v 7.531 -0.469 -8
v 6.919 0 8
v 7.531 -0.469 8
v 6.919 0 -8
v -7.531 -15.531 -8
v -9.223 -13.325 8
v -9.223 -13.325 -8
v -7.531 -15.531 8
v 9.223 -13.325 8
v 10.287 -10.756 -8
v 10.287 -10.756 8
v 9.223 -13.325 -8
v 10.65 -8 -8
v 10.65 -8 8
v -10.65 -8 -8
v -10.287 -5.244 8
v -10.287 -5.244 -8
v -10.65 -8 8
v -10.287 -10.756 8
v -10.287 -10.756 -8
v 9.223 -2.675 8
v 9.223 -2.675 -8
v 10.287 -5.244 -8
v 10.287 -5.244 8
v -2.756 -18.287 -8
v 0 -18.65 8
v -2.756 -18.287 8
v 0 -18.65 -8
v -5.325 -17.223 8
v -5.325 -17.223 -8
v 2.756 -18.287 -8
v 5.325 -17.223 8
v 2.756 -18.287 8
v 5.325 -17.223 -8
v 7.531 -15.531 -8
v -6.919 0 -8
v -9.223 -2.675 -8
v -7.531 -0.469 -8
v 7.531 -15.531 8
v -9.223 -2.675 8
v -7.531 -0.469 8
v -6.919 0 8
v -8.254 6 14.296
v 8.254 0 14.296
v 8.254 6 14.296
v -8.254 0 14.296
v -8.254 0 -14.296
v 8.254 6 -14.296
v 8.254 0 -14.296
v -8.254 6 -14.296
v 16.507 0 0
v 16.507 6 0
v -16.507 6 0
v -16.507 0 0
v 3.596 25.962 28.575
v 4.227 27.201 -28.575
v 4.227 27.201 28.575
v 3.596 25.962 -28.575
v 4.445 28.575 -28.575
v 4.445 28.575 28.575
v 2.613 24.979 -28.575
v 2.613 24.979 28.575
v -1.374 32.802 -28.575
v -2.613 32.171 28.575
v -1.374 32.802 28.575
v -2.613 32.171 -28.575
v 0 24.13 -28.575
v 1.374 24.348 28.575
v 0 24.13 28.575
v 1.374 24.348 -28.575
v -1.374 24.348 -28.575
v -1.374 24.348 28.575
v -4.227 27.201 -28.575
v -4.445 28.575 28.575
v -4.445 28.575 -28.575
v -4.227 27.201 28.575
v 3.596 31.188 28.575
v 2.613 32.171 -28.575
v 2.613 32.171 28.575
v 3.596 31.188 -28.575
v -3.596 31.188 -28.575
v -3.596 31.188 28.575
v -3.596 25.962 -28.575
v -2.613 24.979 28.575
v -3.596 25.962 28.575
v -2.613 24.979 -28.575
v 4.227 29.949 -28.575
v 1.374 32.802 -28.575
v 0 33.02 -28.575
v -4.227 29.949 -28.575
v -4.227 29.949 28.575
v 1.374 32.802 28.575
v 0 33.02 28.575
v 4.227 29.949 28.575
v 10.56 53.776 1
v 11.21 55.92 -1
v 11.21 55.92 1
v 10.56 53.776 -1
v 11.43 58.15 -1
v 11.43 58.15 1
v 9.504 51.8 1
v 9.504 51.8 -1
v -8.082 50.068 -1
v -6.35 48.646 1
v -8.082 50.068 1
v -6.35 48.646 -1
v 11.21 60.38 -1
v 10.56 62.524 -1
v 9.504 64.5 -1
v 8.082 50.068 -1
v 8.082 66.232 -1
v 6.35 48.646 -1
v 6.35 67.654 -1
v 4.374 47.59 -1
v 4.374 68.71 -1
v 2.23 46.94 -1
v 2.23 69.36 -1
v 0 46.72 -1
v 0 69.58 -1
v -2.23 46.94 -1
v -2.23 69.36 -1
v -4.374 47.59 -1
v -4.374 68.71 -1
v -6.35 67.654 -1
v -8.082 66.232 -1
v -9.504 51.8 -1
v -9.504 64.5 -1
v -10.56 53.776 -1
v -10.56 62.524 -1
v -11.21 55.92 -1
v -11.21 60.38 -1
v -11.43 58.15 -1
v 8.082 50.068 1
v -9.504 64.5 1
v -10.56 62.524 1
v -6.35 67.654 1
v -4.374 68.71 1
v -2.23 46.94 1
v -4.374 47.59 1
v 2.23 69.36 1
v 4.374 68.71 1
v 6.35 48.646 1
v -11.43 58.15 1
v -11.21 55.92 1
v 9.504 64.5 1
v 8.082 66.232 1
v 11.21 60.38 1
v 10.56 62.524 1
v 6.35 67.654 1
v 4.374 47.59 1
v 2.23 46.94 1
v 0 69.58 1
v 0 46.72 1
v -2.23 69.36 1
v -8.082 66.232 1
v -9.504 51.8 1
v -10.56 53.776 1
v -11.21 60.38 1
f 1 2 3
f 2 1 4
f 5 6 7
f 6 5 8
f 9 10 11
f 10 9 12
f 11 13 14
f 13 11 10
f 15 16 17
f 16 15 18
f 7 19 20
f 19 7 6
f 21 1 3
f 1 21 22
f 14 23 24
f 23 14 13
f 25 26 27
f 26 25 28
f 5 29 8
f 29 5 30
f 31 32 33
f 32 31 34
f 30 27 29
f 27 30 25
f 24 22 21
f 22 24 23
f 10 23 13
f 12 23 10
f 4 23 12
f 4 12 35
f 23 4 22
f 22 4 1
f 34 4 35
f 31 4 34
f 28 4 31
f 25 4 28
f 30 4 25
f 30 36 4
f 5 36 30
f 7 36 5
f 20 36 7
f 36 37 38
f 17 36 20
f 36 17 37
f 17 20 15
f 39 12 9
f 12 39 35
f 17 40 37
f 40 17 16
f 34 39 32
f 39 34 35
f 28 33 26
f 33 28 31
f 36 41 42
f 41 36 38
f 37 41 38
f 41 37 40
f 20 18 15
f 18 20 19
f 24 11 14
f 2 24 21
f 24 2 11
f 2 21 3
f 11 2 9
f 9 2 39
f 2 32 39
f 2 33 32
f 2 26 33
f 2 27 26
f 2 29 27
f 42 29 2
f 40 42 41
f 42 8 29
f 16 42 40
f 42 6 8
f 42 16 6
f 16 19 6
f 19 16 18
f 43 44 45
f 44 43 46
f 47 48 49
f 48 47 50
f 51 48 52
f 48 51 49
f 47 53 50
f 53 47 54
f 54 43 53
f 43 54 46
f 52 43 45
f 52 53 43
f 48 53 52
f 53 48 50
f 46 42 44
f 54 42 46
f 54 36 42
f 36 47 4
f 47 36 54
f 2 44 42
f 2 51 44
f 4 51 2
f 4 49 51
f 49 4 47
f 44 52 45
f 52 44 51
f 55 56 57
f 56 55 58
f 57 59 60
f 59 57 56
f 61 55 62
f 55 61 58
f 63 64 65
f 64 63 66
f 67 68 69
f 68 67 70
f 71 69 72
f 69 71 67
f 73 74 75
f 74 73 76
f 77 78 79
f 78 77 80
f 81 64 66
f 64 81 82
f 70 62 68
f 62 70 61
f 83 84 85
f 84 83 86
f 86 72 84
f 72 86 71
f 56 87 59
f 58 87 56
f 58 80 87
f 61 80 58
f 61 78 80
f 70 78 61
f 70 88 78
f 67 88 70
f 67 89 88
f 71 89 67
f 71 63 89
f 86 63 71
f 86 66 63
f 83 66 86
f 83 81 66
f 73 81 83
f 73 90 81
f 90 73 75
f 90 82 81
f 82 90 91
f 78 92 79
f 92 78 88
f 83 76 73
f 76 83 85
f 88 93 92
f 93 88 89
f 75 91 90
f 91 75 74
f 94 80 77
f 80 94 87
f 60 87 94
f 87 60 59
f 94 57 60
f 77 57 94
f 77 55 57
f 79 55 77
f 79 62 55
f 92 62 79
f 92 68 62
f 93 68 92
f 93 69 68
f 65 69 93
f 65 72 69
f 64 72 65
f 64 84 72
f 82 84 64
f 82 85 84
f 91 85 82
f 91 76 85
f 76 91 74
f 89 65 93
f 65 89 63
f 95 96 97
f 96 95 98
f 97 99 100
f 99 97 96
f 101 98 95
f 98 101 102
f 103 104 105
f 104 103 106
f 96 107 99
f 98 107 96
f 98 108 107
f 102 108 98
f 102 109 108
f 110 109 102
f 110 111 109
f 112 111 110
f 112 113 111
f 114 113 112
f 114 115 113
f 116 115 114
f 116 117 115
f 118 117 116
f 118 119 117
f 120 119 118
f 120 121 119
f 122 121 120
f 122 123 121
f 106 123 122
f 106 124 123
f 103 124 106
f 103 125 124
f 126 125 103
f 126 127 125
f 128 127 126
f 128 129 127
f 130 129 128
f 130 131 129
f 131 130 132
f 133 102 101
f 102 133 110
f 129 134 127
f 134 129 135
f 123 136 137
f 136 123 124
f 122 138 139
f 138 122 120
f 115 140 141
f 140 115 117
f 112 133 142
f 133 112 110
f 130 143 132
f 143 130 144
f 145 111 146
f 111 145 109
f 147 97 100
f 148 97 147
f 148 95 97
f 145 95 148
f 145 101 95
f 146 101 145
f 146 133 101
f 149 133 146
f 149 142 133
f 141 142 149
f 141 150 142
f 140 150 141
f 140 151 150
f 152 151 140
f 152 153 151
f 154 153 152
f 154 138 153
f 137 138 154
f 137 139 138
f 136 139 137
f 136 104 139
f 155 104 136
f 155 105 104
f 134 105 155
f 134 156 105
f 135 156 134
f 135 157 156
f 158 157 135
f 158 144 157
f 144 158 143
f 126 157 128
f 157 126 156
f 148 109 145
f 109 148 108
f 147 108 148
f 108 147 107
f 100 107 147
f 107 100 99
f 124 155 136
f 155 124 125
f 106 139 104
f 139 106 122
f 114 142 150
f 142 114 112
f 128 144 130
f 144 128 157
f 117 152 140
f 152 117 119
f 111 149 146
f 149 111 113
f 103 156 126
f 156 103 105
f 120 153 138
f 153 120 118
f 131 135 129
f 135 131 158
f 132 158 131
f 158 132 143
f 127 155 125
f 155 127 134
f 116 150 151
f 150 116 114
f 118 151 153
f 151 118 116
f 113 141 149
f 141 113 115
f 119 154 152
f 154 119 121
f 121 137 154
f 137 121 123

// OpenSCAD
// Auto-generated by scripts/author_from_manifest.py (Phase D.3).
// Source: data/phase_d_manifest.json (sku_intent='reliable-fp-attic-155f').
// Do not hand-edit — regenerate from the manifest.
//
// @part reliable_fp_attic_155f
// @kind sprinkler_head
// @category head.upright.k56
// @display-name "Reliable Model FP Attic Sprinkler K5.6 155°F"
// @mfg reliable_automatic_sprinkler
// @mfg-pn FP
// @listing UL FM
// @hazard-classes LH OH1
// @price-usd 22.50
// @install-minutes 10
// @crew journeyman
// @k-factor 5.6
// @orientation upright
// @response quick
// @temperature 155F
// @param size_in number default=0.5 label="Size" unit="in"
// @port inlet position=[0,0.014,0] direction=[0,1,0] style=NPT_threaded size_in=0.5 role=drop

size_in = 0.5;
k_factor = 5.6;

length_mm   = 57.15;
body_dia_mm = 25.40;
thread_od   = 21.3;
thread_len  = 16;
deflector_d = body_dia_mm * 0.9;

rotate([180,0,0]) union() {
    translate([0, thread_len/2, 0])
        cylinder(h = thread_len, d = thread_od, center = true, $fn = 24);
    translate([0, -3, 0])
        rotate([90, 0, 0])
        cylinder(h = 6, d = thread_od * 1.55, $fn = 6, center = true);
    translate([0, -length_mm/2, 0])
        cylinder(h = length_mm, d = body_dia_mm * 0.35, center = true, $fn = 20);
    translate([0, -length_mm - 1, 0])
        cylinder(h = 2, d = deflector_d, center = true, $fn = 32);
}
